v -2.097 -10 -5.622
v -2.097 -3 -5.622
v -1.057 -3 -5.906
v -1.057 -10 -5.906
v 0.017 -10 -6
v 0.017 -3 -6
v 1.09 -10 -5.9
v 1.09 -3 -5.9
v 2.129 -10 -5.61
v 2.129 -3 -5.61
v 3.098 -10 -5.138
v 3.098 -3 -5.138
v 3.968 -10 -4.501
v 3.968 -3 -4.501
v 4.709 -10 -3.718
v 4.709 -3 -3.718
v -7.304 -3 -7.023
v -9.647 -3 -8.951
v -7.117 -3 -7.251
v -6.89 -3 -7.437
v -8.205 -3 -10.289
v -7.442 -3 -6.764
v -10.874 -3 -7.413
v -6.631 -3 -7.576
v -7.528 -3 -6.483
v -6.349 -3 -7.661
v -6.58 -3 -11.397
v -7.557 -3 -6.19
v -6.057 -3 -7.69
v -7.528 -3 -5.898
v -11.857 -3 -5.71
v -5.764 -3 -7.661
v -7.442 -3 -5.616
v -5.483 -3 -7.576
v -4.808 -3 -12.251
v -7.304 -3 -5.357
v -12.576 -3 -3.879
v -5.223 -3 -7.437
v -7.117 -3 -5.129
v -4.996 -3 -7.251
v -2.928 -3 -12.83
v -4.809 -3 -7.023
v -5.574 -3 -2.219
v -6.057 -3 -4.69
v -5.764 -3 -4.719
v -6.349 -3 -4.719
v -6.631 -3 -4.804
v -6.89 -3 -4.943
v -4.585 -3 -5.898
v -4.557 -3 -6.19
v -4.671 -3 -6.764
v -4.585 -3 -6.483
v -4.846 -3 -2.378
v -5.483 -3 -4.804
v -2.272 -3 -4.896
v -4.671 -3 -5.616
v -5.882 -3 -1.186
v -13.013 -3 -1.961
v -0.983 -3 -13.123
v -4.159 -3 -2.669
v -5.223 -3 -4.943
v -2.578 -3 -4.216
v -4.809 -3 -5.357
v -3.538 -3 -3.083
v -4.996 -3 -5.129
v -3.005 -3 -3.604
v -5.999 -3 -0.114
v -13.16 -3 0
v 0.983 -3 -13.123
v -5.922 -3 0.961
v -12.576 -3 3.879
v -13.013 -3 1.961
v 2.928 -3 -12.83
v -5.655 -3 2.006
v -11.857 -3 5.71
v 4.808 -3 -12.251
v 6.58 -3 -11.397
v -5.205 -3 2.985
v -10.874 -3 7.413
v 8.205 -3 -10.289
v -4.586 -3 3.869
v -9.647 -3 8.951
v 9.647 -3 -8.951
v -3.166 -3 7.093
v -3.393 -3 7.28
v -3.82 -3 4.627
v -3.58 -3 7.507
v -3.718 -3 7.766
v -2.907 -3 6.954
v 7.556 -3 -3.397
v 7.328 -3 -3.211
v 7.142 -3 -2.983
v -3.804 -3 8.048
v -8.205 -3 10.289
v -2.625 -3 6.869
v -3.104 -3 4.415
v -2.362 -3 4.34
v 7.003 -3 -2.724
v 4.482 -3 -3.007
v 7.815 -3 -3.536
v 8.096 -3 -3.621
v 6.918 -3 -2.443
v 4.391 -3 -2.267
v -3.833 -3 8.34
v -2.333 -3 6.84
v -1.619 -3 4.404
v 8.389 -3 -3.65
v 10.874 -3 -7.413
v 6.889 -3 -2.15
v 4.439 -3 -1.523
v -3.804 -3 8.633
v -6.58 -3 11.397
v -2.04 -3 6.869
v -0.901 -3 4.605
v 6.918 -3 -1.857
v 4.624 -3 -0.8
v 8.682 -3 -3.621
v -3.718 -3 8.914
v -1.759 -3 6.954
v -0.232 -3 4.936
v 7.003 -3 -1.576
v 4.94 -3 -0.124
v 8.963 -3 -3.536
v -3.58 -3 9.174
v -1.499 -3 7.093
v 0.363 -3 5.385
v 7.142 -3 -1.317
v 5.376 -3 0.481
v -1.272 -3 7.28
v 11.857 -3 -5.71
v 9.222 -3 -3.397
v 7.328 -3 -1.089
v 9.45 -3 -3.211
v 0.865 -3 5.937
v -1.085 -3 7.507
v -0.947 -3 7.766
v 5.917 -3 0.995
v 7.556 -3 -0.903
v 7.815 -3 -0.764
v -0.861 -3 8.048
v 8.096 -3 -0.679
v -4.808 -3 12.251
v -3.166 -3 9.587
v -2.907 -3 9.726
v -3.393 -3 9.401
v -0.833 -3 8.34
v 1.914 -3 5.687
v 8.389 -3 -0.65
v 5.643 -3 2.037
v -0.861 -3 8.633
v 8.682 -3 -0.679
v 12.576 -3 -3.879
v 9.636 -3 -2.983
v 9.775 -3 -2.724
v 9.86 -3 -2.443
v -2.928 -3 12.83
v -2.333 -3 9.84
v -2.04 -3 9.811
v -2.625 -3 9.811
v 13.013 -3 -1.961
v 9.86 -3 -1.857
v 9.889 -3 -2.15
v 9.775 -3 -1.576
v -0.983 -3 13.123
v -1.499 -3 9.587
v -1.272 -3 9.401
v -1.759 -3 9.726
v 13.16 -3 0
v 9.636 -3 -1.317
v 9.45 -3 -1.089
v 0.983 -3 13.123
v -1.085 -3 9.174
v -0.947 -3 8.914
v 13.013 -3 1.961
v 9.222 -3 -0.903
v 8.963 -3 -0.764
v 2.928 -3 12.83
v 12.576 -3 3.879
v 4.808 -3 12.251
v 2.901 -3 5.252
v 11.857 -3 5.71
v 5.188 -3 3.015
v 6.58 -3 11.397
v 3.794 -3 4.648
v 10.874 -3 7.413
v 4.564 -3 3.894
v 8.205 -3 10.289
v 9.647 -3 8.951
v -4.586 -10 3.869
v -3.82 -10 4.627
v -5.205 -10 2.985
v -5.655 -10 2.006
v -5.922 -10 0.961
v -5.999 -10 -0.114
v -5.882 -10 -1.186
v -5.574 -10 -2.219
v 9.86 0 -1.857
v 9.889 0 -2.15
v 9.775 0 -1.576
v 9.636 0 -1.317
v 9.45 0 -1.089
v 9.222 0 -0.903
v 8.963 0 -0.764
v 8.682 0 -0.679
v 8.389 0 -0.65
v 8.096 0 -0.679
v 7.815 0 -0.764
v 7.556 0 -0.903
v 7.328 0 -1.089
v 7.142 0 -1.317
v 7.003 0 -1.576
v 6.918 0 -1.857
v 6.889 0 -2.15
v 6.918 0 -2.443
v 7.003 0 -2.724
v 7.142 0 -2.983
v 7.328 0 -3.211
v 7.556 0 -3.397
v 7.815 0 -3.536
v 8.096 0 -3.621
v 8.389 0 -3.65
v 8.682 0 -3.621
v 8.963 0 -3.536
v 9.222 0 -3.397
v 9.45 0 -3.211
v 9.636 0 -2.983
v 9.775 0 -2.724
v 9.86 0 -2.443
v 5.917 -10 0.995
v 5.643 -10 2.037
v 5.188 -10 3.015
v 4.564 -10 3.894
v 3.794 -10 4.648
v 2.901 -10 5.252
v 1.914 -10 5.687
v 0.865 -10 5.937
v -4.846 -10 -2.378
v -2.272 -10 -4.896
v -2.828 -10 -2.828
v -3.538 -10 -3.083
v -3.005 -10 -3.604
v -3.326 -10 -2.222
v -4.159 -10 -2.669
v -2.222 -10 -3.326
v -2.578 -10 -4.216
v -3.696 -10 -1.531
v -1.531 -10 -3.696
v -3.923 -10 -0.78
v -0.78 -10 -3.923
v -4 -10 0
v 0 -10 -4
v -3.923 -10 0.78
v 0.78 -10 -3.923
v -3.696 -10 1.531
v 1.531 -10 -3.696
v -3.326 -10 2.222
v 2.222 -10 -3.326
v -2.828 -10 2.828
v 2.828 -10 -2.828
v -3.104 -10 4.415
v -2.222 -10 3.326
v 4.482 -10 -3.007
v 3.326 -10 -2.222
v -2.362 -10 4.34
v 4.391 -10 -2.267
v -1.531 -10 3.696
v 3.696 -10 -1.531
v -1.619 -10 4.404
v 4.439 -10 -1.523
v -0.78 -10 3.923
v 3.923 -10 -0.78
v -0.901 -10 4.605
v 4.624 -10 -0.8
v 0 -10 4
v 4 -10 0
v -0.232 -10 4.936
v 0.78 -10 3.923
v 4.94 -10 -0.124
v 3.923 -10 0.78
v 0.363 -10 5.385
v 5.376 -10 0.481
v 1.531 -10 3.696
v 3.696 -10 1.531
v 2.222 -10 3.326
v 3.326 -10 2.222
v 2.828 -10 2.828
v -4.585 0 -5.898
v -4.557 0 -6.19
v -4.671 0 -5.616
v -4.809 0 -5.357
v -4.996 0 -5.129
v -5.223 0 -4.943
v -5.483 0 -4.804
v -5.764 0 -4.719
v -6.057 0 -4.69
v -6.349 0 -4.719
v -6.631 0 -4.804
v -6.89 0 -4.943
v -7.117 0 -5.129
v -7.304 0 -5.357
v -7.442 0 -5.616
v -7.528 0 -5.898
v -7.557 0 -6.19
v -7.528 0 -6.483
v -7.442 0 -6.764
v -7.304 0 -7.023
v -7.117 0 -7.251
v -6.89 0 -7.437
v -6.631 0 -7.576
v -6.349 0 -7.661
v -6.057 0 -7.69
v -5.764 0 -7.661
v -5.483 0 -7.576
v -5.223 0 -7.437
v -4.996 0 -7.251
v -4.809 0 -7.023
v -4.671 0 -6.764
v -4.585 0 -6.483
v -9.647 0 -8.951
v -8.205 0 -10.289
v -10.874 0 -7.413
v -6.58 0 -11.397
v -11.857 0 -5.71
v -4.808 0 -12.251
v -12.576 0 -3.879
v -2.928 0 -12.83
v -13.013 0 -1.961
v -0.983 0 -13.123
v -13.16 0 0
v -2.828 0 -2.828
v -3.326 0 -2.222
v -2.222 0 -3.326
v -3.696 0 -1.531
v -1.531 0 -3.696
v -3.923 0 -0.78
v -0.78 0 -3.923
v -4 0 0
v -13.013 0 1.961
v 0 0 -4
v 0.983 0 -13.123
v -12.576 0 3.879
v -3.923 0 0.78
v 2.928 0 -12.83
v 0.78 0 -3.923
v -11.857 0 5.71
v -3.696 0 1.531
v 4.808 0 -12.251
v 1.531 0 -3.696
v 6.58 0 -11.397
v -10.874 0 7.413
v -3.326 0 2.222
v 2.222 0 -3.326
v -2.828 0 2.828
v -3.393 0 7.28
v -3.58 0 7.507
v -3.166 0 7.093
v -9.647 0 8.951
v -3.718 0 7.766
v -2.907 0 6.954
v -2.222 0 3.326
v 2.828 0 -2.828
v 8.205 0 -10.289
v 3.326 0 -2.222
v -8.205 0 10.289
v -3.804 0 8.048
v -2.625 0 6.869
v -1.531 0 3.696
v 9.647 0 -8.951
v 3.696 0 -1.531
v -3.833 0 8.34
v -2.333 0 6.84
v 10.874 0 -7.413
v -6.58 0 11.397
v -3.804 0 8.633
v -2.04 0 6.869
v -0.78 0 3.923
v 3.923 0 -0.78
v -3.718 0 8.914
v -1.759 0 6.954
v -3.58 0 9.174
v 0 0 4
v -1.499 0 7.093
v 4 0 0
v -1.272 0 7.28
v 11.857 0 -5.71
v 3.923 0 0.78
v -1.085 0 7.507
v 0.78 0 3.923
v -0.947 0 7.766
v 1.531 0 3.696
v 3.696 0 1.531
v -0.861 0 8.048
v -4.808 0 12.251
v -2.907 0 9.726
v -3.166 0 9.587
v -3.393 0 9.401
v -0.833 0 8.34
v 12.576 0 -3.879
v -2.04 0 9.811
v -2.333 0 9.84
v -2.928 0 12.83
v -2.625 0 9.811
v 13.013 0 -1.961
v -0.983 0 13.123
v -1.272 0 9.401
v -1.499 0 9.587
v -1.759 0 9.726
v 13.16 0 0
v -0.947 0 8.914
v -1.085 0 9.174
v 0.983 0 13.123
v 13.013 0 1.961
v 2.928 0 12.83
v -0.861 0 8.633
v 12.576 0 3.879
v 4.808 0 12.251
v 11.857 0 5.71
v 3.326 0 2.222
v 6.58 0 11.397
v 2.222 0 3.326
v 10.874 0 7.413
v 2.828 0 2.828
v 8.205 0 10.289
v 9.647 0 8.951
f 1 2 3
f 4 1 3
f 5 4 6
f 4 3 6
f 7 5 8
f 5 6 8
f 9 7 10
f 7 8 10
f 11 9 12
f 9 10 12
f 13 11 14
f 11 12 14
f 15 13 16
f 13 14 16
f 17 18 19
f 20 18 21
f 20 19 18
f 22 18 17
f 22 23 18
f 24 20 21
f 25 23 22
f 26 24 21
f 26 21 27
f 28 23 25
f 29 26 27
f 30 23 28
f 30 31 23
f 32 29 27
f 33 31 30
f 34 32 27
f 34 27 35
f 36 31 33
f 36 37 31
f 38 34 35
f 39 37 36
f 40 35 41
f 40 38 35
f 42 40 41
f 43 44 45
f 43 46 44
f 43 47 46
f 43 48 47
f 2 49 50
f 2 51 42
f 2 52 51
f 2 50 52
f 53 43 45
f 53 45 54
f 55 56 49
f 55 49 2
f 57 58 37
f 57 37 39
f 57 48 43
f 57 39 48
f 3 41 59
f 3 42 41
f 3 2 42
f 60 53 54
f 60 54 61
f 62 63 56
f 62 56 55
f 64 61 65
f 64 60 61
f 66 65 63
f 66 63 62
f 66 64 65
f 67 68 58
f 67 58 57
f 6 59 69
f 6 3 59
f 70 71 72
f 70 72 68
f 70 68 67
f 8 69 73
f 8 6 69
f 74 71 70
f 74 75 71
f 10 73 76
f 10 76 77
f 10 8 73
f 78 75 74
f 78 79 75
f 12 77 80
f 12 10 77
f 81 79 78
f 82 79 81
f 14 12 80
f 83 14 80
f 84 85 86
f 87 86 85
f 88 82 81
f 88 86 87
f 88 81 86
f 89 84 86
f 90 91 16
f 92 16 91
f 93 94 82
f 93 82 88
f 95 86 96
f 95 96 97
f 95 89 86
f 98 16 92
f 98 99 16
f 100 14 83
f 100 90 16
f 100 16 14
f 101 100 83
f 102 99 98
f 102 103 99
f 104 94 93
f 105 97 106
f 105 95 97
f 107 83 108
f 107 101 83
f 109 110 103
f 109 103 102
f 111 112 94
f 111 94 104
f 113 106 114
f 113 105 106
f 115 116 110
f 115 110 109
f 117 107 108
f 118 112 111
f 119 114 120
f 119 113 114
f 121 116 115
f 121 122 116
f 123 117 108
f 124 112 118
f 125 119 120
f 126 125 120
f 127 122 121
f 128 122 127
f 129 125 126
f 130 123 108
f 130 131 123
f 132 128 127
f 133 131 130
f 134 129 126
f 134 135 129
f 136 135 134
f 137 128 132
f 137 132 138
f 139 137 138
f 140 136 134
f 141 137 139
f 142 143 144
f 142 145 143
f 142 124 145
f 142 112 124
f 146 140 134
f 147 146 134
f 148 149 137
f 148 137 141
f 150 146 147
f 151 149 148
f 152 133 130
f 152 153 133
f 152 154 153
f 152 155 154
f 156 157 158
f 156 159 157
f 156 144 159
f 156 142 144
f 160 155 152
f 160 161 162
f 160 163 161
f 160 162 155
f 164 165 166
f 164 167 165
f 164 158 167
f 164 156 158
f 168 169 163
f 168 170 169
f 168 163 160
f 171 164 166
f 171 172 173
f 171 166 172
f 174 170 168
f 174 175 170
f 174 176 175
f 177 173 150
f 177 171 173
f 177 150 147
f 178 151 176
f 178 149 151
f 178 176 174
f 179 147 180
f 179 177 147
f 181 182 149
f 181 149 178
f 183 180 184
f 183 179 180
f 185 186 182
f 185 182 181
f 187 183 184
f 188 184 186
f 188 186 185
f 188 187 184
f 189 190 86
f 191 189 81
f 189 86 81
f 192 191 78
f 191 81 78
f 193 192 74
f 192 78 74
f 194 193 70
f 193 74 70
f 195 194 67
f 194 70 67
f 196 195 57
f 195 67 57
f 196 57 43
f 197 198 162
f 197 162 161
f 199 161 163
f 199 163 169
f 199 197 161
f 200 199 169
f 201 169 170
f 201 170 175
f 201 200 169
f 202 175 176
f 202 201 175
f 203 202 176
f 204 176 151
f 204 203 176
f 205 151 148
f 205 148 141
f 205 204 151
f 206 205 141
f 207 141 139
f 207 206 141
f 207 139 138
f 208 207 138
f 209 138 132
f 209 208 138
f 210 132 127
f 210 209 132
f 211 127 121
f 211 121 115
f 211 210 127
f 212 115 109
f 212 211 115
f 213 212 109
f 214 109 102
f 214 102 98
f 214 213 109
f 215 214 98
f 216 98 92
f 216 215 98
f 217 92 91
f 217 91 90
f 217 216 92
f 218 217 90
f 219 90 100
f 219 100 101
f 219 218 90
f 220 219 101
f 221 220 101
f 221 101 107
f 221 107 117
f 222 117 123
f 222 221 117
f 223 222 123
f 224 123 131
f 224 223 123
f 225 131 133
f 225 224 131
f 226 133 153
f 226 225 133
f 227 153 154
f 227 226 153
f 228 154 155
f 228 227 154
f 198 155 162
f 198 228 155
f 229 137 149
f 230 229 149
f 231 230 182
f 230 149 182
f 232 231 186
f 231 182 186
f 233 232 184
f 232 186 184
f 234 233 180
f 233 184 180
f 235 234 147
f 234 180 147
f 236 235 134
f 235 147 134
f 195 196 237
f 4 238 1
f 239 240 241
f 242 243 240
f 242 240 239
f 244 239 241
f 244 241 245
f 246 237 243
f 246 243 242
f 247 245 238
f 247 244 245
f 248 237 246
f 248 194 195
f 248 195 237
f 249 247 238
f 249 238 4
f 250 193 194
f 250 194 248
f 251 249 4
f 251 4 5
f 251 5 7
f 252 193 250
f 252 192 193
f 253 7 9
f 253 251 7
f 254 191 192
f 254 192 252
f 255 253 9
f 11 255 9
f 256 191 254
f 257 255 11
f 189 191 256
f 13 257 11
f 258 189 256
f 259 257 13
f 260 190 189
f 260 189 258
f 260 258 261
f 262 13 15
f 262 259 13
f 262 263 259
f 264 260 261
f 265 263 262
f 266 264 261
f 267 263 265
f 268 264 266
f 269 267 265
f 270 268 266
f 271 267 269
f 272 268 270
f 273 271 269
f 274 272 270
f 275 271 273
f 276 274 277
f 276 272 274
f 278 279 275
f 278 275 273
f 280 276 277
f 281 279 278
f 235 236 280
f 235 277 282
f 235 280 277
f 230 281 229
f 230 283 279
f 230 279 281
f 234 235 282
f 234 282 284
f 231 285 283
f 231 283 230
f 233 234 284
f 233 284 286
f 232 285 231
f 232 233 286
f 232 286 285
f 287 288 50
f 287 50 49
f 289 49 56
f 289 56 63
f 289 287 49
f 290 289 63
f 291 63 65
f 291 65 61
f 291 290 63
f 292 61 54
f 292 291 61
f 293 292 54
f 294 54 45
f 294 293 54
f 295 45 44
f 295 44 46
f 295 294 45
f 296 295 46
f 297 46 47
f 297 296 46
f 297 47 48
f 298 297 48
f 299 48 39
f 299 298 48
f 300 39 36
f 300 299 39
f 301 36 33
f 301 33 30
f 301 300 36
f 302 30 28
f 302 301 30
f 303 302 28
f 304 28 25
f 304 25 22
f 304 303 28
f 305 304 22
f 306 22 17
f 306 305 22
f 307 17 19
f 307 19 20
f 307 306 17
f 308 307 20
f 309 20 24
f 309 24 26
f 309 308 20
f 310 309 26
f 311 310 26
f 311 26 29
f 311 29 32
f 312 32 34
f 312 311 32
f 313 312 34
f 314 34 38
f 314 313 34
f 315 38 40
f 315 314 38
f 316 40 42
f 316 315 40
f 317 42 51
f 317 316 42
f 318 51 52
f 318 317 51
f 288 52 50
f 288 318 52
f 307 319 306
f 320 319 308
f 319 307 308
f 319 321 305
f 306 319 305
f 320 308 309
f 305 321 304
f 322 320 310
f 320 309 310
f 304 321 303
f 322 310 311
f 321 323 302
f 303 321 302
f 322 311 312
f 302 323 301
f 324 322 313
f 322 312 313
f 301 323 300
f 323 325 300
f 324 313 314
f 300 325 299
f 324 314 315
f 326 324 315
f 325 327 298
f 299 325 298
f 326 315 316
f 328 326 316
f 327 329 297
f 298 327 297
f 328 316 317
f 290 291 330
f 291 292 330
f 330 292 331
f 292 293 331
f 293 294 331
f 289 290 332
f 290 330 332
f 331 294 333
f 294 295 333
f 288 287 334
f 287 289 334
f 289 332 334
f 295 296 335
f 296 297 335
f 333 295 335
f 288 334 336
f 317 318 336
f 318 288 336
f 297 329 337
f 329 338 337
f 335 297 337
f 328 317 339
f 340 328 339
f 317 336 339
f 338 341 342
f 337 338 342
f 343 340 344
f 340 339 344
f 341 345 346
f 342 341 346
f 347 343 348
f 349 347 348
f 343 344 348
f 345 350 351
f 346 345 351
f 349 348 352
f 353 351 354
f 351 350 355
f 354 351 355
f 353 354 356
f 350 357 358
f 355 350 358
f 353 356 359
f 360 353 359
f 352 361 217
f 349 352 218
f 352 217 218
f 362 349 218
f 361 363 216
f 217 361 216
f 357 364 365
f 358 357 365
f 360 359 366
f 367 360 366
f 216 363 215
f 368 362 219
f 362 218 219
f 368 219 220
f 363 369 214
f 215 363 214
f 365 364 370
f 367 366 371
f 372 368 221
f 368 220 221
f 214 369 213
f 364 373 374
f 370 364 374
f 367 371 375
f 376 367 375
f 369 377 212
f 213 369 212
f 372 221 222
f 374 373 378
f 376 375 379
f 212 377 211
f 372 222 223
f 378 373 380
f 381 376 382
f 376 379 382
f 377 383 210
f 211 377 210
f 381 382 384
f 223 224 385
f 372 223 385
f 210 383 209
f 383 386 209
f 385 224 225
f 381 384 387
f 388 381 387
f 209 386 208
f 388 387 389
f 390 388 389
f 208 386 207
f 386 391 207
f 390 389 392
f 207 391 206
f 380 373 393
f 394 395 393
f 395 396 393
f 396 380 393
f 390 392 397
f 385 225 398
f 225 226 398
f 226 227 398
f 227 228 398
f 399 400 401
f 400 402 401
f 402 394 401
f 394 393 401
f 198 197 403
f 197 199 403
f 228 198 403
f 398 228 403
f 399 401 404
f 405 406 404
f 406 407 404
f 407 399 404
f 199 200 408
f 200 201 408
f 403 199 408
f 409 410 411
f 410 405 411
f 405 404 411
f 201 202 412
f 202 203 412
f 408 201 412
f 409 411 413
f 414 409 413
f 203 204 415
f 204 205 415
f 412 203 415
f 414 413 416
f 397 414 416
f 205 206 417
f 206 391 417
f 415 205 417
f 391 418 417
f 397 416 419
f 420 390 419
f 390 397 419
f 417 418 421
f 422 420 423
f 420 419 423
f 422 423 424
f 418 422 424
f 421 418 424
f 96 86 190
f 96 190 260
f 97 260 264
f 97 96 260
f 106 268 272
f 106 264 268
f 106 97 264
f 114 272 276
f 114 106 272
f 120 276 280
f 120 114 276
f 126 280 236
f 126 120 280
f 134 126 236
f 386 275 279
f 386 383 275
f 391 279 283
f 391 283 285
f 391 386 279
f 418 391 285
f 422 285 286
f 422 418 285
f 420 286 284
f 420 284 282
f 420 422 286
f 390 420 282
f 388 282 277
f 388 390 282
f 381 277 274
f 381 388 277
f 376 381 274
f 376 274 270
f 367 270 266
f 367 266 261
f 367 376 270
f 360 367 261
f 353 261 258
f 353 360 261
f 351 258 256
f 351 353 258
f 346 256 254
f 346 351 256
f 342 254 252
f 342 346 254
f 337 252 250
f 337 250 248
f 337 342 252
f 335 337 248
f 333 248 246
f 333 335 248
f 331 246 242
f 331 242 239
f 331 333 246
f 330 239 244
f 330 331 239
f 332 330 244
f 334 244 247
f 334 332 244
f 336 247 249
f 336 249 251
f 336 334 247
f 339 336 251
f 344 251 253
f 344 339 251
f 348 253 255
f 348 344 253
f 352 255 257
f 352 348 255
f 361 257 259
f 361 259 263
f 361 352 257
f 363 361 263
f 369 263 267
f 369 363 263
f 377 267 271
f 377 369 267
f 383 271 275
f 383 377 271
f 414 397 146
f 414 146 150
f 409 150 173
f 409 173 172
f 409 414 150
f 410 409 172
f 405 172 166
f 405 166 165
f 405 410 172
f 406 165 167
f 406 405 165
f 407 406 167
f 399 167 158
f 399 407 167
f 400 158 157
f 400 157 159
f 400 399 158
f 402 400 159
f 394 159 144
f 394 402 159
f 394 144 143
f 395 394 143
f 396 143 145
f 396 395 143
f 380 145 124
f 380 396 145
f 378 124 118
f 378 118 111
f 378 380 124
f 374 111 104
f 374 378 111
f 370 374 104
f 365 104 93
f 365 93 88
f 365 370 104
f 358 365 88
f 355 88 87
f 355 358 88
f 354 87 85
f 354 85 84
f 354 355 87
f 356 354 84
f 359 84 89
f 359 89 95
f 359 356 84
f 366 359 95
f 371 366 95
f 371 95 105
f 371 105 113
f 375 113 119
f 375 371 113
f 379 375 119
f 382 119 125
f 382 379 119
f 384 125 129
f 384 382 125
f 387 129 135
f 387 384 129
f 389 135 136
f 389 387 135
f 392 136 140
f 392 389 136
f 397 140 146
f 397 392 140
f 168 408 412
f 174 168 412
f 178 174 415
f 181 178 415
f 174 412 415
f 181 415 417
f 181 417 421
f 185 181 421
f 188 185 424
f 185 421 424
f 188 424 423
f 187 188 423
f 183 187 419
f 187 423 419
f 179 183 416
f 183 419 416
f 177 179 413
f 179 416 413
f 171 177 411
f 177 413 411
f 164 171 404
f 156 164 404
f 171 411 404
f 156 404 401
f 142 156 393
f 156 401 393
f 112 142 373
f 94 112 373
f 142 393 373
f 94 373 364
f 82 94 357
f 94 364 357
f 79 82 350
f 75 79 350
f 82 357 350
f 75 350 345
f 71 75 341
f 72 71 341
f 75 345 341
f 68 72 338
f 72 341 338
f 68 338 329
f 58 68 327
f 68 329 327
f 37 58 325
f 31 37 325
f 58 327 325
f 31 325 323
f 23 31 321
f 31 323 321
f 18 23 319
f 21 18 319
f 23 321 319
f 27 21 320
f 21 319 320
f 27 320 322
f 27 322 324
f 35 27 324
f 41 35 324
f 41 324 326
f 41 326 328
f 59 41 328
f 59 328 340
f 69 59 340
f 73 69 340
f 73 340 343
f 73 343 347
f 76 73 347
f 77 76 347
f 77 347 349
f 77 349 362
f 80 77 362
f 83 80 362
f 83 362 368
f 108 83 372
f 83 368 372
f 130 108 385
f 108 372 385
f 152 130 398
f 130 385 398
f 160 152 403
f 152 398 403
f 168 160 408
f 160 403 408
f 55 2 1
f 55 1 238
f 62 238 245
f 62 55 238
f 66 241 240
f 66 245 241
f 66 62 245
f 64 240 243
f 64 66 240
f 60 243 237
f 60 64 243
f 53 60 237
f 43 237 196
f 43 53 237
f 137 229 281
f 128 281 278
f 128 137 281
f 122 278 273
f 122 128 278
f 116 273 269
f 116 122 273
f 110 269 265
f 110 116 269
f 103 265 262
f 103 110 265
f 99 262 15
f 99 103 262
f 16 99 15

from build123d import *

# Parameters (mm, degrees)
F0_R     = 13.160254
F0_R_2   = 1.5
F0_R_3   = 4
F1_DEPTH = 3
F2_R     = 6
F2_R_2   = 4
F3_DEPTH = 7
F4_R     = 4
F5_DEPTH = 25


with BuildPart() as f1:
    # F0 (on Front) → F1 (new body)
    with BuildSketch(Plane.XZ):
        Circle(F0_R)
        with Locations((-6.056582, -6.190139)):
            Circle(F0_R_2, mode=Mode.SUBTRACT)
        with Locations((8.389108, -2.150084)):
            Circle(F0_R_2, mode=Mode.SUBTRACT)
        with Locations((-2.332527, 8.340223)):
            Circle(F0_R_2, mode=Mode.SUBTRACT)
        Circle(F0_R_3, mode=Mode.SUBTRACT)
    extrude(amount=F1_DEPTH)

    # F2 (on face) → F3 (join)
    with BuildSketch(Plane.XZ.offset(3)):
        Circle(F2_R)
        Circle(F2_R_2, mode=Mode.SUBTRACT)
    extrude(amount=F3_DEPTH)

    # F4 (on face) → F5 (cut)
    with BuildSketch(Plane.XZ.offset(3)):
        with Locations((-2.332527, 8.340223)):
            Circle(F4_R)
        with Locations((8.389108, -2.150084)):
            Circle(F4_R)
        with Locations((-6.056582, -6.190139)):
            Circle(F4_R)
    extrude(amount=F5_DEPTH, mode=Mode.SUBTRACT)


solid = f1.part
